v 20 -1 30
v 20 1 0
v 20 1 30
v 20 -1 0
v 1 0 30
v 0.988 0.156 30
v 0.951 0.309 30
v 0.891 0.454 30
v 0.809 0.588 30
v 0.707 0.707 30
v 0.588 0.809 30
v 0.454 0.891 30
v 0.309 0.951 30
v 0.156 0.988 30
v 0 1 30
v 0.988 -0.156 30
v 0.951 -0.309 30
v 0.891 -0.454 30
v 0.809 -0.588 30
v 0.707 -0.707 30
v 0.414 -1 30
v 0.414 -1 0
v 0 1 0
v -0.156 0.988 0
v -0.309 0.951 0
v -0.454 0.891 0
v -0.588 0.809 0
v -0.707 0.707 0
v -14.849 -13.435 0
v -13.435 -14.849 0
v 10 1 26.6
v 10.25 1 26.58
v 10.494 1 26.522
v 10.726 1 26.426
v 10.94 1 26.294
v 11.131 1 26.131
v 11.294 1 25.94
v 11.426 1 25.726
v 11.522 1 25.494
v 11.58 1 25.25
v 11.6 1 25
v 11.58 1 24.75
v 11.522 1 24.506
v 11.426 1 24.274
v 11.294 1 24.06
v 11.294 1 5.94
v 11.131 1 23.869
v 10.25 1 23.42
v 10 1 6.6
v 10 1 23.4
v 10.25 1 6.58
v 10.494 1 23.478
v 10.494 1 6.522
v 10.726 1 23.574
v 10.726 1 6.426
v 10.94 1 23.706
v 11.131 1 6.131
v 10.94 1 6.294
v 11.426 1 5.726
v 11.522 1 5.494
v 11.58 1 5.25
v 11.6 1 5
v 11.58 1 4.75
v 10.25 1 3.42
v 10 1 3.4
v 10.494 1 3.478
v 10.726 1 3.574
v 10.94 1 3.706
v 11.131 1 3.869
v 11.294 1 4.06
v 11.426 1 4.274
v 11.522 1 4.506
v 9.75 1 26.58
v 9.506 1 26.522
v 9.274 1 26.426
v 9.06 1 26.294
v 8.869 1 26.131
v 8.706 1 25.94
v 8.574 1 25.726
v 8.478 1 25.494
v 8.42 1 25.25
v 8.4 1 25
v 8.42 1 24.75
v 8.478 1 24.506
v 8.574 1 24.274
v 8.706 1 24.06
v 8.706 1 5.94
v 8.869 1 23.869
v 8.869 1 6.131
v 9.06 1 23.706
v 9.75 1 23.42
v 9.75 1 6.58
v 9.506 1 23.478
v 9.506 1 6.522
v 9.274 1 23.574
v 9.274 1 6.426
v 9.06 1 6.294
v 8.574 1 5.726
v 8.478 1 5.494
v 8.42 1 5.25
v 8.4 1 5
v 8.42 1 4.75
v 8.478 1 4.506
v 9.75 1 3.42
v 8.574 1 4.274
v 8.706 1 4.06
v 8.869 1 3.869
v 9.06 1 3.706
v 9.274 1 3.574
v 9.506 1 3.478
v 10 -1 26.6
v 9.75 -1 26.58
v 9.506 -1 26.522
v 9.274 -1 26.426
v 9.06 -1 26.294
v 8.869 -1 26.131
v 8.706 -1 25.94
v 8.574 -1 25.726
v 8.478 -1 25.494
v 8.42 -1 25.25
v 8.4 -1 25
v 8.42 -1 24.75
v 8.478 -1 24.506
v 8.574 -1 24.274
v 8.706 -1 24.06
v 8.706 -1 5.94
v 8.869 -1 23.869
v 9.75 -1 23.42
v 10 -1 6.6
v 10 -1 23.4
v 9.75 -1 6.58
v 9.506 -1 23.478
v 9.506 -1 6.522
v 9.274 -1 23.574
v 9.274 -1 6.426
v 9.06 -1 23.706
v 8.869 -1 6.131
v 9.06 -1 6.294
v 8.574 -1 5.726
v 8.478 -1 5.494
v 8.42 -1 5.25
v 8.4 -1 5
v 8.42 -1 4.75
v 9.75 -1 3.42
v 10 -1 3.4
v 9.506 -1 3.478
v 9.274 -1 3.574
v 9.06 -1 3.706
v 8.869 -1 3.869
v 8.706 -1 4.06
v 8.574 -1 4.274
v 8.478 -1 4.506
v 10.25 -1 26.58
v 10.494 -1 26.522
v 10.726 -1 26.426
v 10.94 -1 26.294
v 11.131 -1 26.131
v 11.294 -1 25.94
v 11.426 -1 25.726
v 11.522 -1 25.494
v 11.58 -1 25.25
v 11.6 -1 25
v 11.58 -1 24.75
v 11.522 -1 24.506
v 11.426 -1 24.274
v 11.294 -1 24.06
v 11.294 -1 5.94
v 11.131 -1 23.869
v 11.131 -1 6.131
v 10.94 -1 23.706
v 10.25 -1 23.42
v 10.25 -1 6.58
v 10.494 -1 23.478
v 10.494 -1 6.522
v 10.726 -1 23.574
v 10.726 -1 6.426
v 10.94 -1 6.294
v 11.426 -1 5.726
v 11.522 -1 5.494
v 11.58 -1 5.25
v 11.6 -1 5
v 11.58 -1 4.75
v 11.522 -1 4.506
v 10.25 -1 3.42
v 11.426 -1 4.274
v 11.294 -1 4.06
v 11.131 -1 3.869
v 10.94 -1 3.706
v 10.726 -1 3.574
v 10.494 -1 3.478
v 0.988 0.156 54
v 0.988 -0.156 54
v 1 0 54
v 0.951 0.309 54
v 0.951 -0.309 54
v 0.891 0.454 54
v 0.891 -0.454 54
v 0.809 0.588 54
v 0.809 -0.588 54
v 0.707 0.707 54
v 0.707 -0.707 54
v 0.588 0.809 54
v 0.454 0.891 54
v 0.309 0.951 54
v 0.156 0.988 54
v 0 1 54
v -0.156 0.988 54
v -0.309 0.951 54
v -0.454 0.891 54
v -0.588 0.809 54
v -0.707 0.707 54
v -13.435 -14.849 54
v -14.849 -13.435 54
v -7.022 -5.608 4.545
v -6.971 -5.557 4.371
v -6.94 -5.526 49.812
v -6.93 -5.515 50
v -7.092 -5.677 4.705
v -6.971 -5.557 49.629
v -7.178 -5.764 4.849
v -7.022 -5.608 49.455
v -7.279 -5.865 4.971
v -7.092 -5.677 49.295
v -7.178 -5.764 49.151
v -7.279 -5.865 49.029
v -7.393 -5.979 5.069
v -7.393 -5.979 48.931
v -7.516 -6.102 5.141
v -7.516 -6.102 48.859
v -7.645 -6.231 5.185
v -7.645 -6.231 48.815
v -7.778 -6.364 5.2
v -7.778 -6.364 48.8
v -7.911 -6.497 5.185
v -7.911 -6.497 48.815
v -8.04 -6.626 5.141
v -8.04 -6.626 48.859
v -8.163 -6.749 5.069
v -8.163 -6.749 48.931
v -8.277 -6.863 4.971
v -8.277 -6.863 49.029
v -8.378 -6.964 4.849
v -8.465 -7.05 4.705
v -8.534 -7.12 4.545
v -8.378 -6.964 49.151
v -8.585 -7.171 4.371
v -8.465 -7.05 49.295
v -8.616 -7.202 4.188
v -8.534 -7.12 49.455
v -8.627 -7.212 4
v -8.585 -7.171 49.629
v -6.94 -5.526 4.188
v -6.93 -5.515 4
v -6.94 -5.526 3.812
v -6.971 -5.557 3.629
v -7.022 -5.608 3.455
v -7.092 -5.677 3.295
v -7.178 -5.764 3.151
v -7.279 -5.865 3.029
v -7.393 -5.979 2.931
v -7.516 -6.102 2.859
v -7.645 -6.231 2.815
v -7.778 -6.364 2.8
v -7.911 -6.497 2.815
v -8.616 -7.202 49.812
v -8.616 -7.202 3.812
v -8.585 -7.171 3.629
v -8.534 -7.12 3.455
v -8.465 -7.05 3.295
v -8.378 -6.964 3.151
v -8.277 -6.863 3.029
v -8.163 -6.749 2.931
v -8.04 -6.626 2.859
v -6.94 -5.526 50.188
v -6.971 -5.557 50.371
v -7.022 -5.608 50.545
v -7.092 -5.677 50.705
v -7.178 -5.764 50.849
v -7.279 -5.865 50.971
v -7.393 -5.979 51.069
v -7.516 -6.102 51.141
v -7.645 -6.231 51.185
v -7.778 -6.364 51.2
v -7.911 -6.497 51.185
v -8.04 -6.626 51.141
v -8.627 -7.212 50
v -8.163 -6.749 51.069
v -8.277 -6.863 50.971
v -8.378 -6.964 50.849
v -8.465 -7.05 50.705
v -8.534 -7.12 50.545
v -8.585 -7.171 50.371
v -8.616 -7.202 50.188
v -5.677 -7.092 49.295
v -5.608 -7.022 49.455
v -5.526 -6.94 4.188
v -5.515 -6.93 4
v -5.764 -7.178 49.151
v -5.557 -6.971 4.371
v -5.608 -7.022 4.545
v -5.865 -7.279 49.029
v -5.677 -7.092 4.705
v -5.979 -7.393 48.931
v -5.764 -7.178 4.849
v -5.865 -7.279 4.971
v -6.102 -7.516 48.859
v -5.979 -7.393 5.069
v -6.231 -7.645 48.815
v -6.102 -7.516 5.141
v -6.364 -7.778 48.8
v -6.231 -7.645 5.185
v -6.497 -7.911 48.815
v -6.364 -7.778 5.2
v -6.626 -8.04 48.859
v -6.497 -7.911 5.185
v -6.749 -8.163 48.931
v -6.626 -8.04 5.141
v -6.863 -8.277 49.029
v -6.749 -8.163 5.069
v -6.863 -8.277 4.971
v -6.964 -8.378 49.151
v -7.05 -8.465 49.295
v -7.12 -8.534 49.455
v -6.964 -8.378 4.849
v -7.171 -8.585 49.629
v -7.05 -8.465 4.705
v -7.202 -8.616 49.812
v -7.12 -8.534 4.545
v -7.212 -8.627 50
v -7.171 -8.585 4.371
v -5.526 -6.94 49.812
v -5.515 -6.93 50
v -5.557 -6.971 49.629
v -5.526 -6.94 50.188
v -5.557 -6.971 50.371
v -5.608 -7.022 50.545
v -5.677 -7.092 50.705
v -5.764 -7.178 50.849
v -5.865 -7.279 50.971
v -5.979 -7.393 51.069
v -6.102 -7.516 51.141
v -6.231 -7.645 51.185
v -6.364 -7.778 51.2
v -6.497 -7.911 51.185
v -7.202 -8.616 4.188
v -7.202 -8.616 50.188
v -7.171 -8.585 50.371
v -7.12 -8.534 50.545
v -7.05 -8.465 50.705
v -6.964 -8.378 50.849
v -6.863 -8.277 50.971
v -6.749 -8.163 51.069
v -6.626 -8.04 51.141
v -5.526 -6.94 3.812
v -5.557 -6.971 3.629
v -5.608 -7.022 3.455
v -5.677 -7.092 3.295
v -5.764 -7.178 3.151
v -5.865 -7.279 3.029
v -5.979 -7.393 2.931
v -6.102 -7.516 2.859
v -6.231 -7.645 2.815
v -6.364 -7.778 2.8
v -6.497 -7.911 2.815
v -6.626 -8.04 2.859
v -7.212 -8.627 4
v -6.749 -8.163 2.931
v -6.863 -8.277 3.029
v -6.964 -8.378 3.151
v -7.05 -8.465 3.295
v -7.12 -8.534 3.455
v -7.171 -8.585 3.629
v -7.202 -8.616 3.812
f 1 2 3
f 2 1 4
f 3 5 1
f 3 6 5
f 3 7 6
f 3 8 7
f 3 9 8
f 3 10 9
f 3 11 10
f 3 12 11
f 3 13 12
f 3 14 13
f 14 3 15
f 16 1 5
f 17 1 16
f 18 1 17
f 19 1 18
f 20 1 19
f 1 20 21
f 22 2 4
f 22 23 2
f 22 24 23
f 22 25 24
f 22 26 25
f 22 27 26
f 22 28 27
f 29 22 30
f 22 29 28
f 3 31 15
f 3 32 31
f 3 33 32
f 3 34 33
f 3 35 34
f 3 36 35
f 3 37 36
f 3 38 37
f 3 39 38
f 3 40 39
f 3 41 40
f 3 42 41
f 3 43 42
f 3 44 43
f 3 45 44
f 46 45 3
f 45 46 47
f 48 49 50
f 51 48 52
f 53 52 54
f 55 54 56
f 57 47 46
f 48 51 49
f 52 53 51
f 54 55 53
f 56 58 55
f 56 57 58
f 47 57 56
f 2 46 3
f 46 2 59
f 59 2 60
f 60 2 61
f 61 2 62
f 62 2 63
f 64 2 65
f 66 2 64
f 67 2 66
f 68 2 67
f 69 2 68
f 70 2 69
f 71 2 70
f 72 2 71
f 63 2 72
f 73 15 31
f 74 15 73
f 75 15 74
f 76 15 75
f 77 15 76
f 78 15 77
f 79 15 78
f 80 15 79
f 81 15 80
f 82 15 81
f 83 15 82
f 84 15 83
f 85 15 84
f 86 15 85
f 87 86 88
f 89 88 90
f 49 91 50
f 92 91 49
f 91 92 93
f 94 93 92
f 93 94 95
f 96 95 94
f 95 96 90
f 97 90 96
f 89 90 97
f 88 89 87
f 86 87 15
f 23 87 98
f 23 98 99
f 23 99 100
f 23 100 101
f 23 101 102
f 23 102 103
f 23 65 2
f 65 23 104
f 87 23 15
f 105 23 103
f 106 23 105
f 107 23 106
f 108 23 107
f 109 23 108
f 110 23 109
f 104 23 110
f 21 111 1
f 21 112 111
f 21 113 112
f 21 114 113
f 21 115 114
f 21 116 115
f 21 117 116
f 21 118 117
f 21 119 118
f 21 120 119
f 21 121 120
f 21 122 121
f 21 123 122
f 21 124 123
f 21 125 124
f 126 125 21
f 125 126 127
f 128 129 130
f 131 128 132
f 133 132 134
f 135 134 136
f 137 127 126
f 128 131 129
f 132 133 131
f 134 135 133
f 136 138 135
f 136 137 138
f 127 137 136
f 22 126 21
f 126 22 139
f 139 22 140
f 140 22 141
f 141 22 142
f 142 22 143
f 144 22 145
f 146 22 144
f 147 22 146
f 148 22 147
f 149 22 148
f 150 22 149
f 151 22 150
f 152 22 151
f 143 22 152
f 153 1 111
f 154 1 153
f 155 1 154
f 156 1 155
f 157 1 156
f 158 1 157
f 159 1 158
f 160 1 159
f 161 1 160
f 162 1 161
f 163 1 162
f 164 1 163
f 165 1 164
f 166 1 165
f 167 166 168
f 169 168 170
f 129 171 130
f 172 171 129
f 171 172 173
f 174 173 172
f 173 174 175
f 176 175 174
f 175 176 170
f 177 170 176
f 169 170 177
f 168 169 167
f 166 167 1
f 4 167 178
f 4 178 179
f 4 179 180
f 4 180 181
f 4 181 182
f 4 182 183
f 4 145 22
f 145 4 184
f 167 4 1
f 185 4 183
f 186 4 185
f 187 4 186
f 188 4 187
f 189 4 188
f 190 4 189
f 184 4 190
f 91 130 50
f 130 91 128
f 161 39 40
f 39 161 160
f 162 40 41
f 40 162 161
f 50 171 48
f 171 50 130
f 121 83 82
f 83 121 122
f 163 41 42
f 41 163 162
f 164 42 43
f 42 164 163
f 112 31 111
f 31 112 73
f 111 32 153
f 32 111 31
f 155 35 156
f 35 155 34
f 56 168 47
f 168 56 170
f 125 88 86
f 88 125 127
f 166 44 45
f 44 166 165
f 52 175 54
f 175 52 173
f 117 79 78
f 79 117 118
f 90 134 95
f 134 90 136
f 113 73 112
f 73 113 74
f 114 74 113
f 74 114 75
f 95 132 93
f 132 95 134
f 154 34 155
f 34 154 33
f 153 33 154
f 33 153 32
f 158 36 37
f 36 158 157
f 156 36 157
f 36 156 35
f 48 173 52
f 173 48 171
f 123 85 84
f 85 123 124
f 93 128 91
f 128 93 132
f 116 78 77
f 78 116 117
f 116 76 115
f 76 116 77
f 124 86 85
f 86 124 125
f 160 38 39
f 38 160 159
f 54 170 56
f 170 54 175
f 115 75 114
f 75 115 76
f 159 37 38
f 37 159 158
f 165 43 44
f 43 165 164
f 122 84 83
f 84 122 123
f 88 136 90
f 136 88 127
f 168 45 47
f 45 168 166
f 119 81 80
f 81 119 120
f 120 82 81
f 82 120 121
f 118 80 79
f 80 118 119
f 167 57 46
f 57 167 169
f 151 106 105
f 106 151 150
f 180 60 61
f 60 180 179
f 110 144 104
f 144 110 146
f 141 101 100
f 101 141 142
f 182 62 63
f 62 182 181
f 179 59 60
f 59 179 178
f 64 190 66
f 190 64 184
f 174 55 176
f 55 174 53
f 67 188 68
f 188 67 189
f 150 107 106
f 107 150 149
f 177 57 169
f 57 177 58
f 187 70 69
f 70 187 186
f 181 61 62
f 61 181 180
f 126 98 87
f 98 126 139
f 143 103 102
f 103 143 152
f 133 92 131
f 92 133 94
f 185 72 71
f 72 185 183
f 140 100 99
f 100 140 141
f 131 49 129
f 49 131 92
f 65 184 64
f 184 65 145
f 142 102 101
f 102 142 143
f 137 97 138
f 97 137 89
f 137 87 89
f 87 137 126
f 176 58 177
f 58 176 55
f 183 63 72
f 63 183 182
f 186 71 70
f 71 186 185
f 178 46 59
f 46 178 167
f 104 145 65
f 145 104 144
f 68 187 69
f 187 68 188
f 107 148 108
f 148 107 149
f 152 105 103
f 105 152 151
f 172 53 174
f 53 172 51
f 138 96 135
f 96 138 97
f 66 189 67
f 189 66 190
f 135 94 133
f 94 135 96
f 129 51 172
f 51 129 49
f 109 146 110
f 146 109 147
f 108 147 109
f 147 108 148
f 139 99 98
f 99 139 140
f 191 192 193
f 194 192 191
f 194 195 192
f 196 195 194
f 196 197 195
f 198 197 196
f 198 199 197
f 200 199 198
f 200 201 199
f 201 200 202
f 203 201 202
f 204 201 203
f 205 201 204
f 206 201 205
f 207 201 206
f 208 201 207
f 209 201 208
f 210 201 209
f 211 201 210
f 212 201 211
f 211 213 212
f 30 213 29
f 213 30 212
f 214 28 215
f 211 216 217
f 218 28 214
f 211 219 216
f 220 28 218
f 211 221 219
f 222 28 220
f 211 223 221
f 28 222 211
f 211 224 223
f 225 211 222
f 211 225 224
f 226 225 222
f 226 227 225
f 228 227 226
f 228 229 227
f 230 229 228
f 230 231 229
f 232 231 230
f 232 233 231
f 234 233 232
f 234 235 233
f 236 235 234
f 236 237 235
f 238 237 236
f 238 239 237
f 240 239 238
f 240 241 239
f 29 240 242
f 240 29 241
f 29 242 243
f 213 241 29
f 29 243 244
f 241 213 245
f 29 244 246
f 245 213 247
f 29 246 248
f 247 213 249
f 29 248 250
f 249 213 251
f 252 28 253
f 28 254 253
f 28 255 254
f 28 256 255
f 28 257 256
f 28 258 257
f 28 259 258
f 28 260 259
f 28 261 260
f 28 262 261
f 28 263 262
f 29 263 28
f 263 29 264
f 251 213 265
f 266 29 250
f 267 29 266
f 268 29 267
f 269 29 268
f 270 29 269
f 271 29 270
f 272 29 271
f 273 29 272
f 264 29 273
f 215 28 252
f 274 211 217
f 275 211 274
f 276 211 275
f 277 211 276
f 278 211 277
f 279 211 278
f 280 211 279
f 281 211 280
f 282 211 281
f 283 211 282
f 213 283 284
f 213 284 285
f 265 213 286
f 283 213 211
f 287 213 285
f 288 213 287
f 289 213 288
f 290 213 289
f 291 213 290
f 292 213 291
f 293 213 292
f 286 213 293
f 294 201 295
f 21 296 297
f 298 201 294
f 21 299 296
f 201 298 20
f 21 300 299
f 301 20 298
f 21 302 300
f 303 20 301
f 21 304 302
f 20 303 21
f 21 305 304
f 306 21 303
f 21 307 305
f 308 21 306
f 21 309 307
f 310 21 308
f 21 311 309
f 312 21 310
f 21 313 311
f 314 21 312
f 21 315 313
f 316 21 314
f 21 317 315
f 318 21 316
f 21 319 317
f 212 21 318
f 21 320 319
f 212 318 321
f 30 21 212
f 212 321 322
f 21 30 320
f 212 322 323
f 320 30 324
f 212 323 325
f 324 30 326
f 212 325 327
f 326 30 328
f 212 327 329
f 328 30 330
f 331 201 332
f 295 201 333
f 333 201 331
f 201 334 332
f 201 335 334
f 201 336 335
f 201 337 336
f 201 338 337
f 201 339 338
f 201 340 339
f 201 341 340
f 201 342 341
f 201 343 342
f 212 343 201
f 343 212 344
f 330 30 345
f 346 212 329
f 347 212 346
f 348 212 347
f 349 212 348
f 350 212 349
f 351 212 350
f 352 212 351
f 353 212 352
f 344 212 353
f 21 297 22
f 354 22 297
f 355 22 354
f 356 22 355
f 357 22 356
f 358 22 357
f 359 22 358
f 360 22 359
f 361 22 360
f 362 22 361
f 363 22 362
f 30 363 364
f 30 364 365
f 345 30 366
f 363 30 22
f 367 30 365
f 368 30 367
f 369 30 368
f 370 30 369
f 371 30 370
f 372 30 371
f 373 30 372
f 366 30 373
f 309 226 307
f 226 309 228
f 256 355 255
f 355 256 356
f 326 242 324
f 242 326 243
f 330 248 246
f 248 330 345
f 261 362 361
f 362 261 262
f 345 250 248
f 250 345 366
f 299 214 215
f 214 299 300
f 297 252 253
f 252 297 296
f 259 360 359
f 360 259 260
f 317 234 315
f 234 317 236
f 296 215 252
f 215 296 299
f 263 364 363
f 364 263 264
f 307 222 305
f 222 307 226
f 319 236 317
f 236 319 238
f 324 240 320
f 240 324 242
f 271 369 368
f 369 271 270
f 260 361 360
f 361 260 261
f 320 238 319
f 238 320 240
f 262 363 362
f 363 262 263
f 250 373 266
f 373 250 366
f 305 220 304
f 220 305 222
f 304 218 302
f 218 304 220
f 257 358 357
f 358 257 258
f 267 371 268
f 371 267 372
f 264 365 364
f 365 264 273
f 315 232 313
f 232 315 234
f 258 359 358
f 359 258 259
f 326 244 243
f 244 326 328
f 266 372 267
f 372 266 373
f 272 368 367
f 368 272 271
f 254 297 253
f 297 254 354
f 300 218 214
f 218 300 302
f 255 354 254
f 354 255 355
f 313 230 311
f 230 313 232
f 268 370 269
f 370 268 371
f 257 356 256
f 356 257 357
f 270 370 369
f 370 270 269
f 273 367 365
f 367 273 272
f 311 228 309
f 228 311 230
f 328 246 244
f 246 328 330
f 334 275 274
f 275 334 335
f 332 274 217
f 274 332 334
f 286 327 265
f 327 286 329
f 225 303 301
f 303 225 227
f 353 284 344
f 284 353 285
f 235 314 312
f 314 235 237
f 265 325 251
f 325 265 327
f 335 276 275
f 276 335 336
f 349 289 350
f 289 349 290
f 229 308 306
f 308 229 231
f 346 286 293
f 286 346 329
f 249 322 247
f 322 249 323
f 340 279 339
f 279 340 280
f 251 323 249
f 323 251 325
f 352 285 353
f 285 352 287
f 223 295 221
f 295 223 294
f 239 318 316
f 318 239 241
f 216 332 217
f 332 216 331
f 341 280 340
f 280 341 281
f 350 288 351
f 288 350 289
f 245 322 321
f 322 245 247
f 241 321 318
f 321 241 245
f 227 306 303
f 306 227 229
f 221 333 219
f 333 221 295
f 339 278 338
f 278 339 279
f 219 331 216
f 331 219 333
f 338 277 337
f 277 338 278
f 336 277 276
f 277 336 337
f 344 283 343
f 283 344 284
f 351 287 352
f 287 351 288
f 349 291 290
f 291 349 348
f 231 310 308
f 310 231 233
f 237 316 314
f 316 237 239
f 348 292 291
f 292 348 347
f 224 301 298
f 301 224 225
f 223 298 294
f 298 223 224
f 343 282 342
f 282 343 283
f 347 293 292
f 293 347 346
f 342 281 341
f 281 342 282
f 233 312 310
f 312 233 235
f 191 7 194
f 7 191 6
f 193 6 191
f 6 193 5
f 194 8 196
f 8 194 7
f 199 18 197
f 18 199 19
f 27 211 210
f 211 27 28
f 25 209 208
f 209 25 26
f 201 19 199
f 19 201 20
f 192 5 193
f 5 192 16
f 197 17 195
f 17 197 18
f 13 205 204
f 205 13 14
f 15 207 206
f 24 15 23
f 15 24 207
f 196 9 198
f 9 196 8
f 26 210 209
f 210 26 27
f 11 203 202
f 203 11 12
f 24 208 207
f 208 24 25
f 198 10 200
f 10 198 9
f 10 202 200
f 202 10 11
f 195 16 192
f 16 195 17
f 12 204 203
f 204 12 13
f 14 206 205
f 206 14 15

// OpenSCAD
mountSideHt = 30;
sensorSideHt = 54;
holeSpacing = 46;

$fn=40;

difference() {
   translate([0,-1,0]) cube([20,2,mountSideHt]);
   translate([10,3, mountSideHt - 5]) rotate([90,0,0]) cylinder(d=3.2,h=10);
   translate([10,3, 5]) rotate([90,0,0]) cylinder(d=3.2,h=10);
}
rotate([0,0,45]) translate([-20,-1,0]) difference() {
   cube([20,2,sensorSideHt]);
   translate([10,3, (sensorSideHt - holeSpacing)/2]) rotate([90,0,0]) cylinder(d=2.4,h=10);
   translate([10,3, holeSpacing + (sensorSideHt - holeSpacing)/2]) rotate([90,0,0]) cylinder(d=2.4,h=10);
   }
cylinder(d=2,h=sensorSideHt);
